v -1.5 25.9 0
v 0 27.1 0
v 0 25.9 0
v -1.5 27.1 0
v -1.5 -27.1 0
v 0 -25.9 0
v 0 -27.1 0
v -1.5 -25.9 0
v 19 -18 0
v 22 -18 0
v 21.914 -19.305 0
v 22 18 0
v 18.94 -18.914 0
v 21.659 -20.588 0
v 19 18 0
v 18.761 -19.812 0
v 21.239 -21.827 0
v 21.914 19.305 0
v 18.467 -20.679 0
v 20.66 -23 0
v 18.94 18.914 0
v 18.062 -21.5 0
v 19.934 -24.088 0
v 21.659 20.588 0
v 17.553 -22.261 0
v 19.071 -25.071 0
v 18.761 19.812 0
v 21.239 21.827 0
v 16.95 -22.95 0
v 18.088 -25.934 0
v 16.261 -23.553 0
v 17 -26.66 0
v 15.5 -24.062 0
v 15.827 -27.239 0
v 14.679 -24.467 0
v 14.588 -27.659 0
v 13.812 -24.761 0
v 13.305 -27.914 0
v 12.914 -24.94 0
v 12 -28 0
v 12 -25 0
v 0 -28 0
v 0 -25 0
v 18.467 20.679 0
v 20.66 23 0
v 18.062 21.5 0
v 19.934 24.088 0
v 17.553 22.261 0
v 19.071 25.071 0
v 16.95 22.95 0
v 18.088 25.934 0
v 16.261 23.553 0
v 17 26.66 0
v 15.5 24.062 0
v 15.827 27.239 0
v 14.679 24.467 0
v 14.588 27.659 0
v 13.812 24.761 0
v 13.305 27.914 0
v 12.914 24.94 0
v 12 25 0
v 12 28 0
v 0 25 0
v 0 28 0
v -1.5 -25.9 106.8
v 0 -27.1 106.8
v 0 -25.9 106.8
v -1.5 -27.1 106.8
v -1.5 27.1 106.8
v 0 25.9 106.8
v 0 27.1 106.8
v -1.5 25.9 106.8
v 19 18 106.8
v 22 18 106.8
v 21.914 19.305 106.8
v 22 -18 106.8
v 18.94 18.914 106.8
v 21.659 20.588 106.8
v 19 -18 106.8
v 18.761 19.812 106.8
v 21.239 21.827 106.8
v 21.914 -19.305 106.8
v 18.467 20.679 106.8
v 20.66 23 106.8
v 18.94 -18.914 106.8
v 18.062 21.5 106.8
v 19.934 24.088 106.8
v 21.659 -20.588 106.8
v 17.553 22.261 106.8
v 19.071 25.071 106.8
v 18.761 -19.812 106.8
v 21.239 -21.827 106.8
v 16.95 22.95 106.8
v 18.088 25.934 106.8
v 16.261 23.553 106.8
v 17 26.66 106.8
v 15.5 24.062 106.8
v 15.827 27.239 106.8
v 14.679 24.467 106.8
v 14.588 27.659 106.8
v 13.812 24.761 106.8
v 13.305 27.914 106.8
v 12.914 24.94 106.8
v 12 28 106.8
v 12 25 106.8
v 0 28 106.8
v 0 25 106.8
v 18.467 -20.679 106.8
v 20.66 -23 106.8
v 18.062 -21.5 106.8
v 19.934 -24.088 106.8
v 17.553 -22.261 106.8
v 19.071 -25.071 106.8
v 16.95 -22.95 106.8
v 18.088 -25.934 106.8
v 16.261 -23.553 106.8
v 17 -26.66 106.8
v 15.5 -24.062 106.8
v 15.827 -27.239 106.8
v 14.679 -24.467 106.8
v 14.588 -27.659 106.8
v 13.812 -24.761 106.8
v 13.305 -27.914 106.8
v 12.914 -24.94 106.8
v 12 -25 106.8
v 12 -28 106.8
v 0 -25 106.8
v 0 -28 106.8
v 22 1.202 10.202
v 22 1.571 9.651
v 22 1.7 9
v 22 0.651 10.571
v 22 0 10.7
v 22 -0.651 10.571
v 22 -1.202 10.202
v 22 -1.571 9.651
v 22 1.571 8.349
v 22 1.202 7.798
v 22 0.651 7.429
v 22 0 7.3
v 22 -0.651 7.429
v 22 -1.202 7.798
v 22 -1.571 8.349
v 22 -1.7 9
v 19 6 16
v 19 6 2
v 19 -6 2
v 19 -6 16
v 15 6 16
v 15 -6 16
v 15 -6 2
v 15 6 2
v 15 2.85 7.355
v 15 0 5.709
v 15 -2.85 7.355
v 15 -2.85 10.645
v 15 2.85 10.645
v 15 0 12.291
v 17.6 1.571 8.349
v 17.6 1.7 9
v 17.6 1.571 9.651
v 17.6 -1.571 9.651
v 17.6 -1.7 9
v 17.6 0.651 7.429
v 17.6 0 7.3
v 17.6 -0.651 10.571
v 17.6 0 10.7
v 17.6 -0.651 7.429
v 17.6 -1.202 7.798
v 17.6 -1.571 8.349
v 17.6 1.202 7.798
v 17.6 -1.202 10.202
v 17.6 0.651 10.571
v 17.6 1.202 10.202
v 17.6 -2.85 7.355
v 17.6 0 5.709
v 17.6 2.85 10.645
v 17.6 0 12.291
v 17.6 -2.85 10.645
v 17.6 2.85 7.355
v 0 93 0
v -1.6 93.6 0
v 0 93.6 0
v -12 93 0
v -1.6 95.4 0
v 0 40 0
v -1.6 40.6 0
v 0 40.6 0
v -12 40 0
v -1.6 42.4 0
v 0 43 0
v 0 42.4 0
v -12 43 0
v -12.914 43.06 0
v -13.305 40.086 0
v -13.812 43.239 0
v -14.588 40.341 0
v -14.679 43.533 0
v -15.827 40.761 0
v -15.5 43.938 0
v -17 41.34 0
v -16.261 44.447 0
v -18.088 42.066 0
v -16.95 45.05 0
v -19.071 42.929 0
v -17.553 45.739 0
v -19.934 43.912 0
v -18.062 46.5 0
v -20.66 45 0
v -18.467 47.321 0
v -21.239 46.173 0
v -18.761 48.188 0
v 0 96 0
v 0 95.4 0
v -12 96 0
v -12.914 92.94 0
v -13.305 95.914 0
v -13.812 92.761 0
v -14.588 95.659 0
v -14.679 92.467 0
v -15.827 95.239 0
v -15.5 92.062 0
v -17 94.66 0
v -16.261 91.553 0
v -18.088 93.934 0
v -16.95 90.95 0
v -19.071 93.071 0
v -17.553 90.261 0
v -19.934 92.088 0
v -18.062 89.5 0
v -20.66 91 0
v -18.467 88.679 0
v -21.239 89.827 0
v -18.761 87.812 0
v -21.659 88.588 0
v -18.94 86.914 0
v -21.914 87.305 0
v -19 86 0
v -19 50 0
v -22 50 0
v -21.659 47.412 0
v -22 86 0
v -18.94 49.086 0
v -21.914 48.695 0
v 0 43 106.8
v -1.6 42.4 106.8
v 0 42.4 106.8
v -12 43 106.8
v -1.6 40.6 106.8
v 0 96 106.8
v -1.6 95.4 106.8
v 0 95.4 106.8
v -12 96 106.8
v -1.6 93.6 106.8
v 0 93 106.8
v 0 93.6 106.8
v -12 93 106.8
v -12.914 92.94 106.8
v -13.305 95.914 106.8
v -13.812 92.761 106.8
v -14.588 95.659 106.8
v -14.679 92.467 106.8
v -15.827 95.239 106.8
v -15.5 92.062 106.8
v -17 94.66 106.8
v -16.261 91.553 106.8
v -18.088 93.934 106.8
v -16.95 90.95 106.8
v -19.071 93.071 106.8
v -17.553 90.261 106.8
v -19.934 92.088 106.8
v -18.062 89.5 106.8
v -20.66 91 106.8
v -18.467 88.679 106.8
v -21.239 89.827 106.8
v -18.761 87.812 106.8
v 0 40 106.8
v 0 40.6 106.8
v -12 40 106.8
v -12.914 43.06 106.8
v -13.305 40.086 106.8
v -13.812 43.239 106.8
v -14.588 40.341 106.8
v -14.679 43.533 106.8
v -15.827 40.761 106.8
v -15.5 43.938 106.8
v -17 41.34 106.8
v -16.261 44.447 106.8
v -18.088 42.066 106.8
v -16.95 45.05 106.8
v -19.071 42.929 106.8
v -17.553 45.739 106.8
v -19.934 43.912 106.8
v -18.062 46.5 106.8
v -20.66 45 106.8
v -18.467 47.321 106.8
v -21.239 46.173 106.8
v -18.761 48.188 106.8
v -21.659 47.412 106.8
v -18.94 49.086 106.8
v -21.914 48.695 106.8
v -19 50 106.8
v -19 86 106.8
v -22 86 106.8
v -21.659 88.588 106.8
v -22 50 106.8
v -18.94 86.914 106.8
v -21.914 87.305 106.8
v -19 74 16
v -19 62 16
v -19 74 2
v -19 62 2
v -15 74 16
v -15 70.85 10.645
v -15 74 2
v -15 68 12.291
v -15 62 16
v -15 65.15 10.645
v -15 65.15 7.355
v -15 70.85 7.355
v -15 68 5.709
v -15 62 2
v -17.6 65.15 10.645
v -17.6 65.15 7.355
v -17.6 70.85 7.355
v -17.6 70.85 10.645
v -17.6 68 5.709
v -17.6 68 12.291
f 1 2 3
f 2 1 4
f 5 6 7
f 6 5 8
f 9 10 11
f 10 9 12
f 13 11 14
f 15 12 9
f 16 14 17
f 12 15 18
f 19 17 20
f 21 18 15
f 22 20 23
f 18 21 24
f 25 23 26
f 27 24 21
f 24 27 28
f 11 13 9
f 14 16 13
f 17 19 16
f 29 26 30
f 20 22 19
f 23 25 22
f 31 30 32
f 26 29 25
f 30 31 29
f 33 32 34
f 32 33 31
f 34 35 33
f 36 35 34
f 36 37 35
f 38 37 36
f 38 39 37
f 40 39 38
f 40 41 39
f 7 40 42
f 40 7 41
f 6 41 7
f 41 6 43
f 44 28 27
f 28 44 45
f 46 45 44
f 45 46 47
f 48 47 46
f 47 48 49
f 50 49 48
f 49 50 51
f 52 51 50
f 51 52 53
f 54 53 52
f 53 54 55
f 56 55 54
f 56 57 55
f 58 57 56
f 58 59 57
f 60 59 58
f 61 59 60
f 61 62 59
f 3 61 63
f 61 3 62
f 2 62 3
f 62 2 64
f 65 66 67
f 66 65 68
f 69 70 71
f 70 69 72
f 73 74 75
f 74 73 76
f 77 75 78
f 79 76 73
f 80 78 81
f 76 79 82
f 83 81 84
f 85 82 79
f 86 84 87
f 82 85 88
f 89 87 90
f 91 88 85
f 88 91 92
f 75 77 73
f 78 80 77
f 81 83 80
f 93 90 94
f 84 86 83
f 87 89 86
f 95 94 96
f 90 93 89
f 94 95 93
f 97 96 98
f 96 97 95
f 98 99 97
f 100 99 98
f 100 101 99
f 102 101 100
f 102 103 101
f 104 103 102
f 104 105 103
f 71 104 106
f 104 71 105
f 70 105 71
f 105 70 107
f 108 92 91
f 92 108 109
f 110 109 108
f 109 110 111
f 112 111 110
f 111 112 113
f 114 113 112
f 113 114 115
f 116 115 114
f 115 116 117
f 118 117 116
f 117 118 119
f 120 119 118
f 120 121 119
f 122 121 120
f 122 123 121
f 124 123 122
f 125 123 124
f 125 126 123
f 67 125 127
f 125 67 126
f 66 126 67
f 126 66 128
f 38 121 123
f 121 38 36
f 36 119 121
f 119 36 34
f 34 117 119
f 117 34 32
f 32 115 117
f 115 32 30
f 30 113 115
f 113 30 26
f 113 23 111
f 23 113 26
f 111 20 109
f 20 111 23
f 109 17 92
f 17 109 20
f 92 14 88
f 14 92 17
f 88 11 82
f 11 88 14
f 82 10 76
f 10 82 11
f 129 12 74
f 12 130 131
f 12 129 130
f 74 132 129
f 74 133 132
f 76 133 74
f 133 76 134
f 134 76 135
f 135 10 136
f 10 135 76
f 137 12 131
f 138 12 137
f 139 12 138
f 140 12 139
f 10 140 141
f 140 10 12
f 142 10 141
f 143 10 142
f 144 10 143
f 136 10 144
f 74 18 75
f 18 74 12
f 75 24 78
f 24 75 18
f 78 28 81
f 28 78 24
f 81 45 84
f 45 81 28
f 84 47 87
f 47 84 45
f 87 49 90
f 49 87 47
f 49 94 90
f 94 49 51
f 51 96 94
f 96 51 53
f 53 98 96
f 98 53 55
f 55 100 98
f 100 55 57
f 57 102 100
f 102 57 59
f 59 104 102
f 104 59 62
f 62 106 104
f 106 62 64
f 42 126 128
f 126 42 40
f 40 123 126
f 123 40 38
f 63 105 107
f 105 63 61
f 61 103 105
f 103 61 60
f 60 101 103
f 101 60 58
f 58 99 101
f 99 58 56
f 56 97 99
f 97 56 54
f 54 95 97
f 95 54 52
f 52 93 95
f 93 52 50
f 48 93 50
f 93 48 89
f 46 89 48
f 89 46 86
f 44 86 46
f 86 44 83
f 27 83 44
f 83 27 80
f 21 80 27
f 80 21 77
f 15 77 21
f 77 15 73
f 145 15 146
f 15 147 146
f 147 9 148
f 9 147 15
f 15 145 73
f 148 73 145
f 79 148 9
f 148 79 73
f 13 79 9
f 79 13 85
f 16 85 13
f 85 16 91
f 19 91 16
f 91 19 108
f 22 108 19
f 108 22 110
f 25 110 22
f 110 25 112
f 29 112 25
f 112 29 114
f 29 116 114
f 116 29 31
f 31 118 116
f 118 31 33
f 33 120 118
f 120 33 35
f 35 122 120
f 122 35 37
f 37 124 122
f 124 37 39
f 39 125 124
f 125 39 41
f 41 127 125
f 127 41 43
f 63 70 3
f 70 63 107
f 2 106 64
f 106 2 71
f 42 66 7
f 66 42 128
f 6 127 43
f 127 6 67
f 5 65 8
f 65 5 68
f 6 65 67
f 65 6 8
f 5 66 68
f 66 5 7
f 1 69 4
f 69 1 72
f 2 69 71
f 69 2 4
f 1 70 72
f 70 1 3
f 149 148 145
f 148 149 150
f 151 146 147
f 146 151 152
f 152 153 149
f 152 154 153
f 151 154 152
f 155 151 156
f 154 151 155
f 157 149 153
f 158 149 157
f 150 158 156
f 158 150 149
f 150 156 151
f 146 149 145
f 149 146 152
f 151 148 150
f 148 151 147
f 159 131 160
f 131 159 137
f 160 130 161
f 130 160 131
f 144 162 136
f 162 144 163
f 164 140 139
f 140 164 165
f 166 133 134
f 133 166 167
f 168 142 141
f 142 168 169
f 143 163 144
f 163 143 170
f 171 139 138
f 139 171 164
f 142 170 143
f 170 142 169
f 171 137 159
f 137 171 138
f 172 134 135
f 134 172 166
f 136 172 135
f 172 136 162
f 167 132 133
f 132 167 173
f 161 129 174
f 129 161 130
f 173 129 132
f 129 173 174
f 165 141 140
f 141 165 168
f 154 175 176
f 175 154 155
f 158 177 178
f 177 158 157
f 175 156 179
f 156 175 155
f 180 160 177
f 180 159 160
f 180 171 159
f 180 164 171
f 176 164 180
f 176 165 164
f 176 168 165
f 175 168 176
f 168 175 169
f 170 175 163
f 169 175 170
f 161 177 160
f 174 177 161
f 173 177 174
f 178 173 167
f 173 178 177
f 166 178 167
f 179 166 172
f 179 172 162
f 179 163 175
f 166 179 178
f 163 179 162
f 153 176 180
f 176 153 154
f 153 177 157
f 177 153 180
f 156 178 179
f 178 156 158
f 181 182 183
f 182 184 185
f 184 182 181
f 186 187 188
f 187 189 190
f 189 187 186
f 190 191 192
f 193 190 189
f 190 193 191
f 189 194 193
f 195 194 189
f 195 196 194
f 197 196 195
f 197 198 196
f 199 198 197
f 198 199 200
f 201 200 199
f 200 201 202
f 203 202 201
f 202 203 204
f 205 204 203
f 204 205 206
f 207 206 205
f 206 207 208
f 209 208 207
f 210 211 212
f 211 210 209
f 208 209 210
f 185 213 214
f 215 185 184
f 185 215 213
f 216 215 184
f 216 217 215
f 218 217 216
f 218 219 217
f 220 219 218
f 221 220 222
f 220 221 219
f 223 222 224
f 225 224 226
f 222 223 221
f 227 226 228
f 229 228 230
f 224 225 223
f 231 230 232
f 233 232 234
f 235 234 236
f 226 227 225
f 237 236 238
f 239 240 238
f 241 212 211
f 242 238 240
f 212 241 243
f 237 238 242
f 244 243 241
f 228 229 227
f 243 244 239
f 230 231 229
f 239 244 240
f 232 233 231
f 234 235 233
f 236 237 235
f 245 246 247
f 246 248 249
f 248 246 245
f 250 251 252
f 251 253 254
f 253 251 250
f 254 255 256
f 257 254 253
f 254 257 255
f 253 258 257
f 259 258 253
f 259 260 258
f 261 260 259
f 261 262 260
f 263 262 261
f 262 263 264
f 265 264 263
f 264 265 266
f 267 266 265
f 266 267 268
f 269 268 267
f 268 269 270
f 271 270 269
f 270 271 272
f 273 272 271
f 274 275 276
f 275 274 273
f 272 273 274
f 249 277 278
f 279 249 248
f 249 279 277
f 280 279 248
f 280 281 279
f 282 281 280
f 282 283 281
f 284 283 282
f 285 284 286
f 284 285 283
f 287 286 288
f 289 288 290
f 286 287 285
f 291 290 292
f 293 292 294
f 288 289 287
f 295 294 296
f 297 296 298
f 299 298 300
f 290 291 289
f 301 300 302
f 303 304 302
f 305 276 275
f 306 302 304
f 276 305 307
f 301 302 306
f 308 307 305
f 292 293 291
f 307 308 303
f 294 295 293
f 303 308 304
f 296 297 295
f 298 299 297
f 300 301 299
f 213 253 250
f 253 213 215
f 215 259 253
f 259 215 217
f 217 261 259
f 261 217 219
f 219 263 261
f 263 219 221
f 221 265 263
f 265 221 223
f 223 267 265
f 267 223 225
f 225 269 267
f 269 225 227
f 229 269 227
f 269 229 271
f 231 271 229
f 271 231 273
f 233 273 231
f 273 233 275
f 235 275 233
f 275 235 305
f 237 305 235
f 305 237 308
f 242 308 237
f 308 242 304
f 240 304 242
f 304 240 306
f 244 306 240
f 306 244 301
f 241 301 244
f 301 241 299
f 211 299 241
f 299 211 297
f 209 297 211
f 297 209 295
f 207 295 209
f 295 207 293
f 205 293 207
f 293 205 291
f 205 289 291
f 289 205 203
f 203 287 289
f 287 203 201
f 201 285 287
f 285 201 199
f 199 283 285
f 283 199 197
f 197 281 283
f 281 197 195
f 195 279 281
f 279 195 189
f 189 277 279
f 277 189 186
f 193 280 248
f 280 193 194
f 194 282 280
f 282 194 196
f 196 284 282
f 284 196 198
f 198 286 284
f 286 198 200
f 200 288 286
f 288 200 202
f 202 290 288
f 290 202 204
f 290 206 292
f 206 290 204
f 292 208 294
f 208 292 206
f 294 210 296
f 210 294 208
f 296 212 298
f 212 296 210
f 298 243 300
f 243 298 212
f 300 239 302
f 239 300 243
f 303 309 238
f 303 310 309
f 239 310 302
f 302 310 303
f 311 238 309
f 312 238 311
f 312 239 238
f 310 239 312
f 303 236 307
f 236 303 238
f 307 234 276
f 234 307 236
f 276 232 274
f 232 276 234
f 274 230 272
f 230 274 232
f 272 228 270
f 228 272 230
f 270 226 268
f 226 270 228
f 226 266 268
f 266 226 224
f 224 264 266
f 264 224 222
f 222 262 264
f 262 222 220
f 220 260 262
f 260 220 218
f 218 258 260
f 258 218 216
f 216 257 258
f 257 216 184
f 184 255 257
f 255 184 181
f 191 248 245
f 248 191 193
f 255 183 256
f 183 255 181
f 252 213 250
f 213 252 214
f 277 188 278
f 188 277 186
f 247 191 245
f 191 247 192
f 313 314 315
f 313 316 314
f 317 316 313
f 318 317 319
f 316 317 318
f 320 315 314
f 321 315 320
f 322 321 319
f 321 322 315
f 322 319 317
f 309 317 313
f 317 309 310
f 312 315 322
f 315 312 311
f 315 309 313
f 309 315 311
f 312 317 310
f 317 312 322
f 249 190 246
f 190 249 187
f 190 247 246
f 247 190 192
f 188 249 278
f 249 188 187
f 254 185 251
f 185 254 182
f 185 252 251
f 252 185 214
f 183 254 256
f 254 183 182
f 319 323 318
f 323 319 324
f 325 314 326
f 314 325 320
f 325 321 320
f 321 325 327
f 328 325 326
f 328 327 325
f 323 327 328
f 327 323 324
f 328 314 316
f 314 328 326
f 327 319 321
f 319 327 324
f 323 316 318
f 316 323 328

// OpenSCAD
// =====================================================================
// MAST: two segments, each made of a FRONT and a BACK half-shell (clamshell, cables are laid in before closing),
// a collar over the joint, a foot plate with socket (bolted to the deck) and (in pan_tilt_interface.scad) the mast-top plate.
// Local frame of every shell / collar: mast axis = z axis, front = +x. z = 0 is the bottom of the part.
// Default output = the lower segment, both halves, side by side.
// =====================================================================
_robot2_lib = true;   // tells robot2_params.scad that it is used as a library (no demo shape)
include <robot2_params.scad>

show = "lower";   // "lower" | "upper" | "collar" | "foot" | "front_lo" ...
seg_h = (z_mast_top - z_mast_bot) / 2;

module shell_profile() { difference() { rrect2(mast_d, mast_w, mast_r); rrect2(mast_in_d, mast_in_w, mast_r - mast_wall); } }

// side = +1 front half, -1 back half; nut_z = heights of the socket-screw nuts (captive M3 nut on the inside)
module shell_half(side, h, nut_z = []) {
    bx = mast_d / 2 - mast_wall;           // inner face of the front/back wall (19)
    difference() {
        union() {
            intersection() {
                linear_extrude(height = h) shell_profile();
                translate([side > 0 ? 0 : -50, -50, -1]) cube([50, 100, h + 2]);
            }
            if (side > 0) for (sy = [-1, 1]) translate([-1.5, sy * (mast_w / 2 - 1.5) - 0.6, 0]) cube([1.6, 1.2, h]);   // tongue
            for (z = nut_z) translate([side > 0 ? bx - 4 : -bx, -6, z - 7]) cube([4, 12, 14]);                           // nut boss
        }
        if (side < 0) for (sy = [-1, 1]) translate([-1.6, sy * (mast_w / 2 - 1.5) - 0.9, -1]) cube([1.6 + eps, 1.8, h + 2]);   // groove
        for (z = nut_z) {
            translate([side * (bx - 5), 0, z]) rotate([0, 90, 0]) cylinder(d = 3.4, h = 12, $fn = 16);
            if (side > 0) translate([bx - 4, 0, z]) rotate([0, 90, 0]) hexnut_pocket(5.7, 2.6);
            else translate([-(bx - 4), 0, z]) rotate([0, -90, 0]) hexnut_pocket(5.7, 2.6);
        }
    }
}
module lower_pair() {   // lower segment: nut at the bottom (foot socket)
    shell_half(+1, seg_h, [foot_sock_h / 2]);
    translate([0, mast_w + 12, 0]) shell_half(-1, seg_h, [foot_sock_h / 2]);
}
module upper_pair() {   // upper segment: nut at the top (neck socket)
    shell_half(+1, seg_h, [seg_h - neck_sock_h / 2]);
    translate([0, mast_w + 12, 0]) shell_half(-1, seg_h, [seg_h - neck_sock_h / 2]);
}

// collar: two halves, bolted together with 4 x M3 x 20 (+ nuts) through the lugs on both sides
module collar_half(side) {
    t = 3.2;  lug_y = mast_w / 2 + t;
    difference() {
        union() {
            intersection() {
                linear_extrude(height = collar_h) difference() { rrect2(mast_d + 2 * t, mast_w + 2 * t, mast_r + t); rrect2(mast_d + 0.4, mast_w + 0.4, mast_r + 0.2); }
                translate([side > 0 ? 0 : -60, -60, -1]) cube([60, 120, collar_h + 2]);
            }
            for (sy = [-1, 1]) translate([side > 0 ? 0 : -9, sy > 0 ? lug_y - 1 : -lug_y - 8.5 + 1, 0]) cube([9, 8.5, collar_h]);
        }
        for (sy = [-1, 1], z = [10, collar_h - 10]) {
            translate([-12, sy * (lug_y + 3.6), z]) rotate([0, 90, 0]) cylinder(d = 3.4, h = 24, $fn = 16);
            if (side > 0) translate([5, sy * (lug_y + 3.6), z]) rotate([0, 90, 0]) cylinder(d = 6.4, h = 5, $fn = 24);          // screw head
            else translate([-9 - eps, sy * (lug_y + 3.6), z]) rotate([0, 90, 0]) hexnut_pocket(5.7, 2.8);                            // nut
        }
    }
}
module collar_pair() { collar_half(+1); translate([0, mast_w + 40, 0]) collar_half(-1); }

// foot plate with socket (print 1): bolts to the deck with 4 x M4
module foot_plate() {
    difference() {
        union() {
            linear_extrude(height = foot_t) rrect2(foot_d, foot_w, 8);
            linear_extrude(height = foot_t + foot_sock_h) difference() { rrect2(mast_d + 5.6, mast_w + 5.6, mast_r + 2.8); rrect2(mast_d + 0.4, mast_w + 0.4, mast_r + 0.2); }
        }
        translate([0, 0, -1]) linear_extrude(height = foot_t + 2) rrect2(mast_in_d - 2, mast_in_w - 2, 5);       // cable opening
        for (sx = [-1, 1], sy = [-1, 1]) translate([sx * foot_bolt_dx / 2, sy * foot_bolt_dy / 2, -1]) cylinder(d = 4.5, h = foot_t + 2, $fn = 24);
        for (s = [-1, 1]) translate([s * (mast_d / 2 + 4), 0, foot_t + foot_sock_h / 2]) rotate([0, 90, 0]) cylinder(d = 3.4, h = 10, center = true, $fn = 16);
    }
}

if (show == "lower") lower_pair();
else if (show == "upper") upper_pair();
else if (show == "collar") collar_pair();
else if (show == "foot") foot_plate();
